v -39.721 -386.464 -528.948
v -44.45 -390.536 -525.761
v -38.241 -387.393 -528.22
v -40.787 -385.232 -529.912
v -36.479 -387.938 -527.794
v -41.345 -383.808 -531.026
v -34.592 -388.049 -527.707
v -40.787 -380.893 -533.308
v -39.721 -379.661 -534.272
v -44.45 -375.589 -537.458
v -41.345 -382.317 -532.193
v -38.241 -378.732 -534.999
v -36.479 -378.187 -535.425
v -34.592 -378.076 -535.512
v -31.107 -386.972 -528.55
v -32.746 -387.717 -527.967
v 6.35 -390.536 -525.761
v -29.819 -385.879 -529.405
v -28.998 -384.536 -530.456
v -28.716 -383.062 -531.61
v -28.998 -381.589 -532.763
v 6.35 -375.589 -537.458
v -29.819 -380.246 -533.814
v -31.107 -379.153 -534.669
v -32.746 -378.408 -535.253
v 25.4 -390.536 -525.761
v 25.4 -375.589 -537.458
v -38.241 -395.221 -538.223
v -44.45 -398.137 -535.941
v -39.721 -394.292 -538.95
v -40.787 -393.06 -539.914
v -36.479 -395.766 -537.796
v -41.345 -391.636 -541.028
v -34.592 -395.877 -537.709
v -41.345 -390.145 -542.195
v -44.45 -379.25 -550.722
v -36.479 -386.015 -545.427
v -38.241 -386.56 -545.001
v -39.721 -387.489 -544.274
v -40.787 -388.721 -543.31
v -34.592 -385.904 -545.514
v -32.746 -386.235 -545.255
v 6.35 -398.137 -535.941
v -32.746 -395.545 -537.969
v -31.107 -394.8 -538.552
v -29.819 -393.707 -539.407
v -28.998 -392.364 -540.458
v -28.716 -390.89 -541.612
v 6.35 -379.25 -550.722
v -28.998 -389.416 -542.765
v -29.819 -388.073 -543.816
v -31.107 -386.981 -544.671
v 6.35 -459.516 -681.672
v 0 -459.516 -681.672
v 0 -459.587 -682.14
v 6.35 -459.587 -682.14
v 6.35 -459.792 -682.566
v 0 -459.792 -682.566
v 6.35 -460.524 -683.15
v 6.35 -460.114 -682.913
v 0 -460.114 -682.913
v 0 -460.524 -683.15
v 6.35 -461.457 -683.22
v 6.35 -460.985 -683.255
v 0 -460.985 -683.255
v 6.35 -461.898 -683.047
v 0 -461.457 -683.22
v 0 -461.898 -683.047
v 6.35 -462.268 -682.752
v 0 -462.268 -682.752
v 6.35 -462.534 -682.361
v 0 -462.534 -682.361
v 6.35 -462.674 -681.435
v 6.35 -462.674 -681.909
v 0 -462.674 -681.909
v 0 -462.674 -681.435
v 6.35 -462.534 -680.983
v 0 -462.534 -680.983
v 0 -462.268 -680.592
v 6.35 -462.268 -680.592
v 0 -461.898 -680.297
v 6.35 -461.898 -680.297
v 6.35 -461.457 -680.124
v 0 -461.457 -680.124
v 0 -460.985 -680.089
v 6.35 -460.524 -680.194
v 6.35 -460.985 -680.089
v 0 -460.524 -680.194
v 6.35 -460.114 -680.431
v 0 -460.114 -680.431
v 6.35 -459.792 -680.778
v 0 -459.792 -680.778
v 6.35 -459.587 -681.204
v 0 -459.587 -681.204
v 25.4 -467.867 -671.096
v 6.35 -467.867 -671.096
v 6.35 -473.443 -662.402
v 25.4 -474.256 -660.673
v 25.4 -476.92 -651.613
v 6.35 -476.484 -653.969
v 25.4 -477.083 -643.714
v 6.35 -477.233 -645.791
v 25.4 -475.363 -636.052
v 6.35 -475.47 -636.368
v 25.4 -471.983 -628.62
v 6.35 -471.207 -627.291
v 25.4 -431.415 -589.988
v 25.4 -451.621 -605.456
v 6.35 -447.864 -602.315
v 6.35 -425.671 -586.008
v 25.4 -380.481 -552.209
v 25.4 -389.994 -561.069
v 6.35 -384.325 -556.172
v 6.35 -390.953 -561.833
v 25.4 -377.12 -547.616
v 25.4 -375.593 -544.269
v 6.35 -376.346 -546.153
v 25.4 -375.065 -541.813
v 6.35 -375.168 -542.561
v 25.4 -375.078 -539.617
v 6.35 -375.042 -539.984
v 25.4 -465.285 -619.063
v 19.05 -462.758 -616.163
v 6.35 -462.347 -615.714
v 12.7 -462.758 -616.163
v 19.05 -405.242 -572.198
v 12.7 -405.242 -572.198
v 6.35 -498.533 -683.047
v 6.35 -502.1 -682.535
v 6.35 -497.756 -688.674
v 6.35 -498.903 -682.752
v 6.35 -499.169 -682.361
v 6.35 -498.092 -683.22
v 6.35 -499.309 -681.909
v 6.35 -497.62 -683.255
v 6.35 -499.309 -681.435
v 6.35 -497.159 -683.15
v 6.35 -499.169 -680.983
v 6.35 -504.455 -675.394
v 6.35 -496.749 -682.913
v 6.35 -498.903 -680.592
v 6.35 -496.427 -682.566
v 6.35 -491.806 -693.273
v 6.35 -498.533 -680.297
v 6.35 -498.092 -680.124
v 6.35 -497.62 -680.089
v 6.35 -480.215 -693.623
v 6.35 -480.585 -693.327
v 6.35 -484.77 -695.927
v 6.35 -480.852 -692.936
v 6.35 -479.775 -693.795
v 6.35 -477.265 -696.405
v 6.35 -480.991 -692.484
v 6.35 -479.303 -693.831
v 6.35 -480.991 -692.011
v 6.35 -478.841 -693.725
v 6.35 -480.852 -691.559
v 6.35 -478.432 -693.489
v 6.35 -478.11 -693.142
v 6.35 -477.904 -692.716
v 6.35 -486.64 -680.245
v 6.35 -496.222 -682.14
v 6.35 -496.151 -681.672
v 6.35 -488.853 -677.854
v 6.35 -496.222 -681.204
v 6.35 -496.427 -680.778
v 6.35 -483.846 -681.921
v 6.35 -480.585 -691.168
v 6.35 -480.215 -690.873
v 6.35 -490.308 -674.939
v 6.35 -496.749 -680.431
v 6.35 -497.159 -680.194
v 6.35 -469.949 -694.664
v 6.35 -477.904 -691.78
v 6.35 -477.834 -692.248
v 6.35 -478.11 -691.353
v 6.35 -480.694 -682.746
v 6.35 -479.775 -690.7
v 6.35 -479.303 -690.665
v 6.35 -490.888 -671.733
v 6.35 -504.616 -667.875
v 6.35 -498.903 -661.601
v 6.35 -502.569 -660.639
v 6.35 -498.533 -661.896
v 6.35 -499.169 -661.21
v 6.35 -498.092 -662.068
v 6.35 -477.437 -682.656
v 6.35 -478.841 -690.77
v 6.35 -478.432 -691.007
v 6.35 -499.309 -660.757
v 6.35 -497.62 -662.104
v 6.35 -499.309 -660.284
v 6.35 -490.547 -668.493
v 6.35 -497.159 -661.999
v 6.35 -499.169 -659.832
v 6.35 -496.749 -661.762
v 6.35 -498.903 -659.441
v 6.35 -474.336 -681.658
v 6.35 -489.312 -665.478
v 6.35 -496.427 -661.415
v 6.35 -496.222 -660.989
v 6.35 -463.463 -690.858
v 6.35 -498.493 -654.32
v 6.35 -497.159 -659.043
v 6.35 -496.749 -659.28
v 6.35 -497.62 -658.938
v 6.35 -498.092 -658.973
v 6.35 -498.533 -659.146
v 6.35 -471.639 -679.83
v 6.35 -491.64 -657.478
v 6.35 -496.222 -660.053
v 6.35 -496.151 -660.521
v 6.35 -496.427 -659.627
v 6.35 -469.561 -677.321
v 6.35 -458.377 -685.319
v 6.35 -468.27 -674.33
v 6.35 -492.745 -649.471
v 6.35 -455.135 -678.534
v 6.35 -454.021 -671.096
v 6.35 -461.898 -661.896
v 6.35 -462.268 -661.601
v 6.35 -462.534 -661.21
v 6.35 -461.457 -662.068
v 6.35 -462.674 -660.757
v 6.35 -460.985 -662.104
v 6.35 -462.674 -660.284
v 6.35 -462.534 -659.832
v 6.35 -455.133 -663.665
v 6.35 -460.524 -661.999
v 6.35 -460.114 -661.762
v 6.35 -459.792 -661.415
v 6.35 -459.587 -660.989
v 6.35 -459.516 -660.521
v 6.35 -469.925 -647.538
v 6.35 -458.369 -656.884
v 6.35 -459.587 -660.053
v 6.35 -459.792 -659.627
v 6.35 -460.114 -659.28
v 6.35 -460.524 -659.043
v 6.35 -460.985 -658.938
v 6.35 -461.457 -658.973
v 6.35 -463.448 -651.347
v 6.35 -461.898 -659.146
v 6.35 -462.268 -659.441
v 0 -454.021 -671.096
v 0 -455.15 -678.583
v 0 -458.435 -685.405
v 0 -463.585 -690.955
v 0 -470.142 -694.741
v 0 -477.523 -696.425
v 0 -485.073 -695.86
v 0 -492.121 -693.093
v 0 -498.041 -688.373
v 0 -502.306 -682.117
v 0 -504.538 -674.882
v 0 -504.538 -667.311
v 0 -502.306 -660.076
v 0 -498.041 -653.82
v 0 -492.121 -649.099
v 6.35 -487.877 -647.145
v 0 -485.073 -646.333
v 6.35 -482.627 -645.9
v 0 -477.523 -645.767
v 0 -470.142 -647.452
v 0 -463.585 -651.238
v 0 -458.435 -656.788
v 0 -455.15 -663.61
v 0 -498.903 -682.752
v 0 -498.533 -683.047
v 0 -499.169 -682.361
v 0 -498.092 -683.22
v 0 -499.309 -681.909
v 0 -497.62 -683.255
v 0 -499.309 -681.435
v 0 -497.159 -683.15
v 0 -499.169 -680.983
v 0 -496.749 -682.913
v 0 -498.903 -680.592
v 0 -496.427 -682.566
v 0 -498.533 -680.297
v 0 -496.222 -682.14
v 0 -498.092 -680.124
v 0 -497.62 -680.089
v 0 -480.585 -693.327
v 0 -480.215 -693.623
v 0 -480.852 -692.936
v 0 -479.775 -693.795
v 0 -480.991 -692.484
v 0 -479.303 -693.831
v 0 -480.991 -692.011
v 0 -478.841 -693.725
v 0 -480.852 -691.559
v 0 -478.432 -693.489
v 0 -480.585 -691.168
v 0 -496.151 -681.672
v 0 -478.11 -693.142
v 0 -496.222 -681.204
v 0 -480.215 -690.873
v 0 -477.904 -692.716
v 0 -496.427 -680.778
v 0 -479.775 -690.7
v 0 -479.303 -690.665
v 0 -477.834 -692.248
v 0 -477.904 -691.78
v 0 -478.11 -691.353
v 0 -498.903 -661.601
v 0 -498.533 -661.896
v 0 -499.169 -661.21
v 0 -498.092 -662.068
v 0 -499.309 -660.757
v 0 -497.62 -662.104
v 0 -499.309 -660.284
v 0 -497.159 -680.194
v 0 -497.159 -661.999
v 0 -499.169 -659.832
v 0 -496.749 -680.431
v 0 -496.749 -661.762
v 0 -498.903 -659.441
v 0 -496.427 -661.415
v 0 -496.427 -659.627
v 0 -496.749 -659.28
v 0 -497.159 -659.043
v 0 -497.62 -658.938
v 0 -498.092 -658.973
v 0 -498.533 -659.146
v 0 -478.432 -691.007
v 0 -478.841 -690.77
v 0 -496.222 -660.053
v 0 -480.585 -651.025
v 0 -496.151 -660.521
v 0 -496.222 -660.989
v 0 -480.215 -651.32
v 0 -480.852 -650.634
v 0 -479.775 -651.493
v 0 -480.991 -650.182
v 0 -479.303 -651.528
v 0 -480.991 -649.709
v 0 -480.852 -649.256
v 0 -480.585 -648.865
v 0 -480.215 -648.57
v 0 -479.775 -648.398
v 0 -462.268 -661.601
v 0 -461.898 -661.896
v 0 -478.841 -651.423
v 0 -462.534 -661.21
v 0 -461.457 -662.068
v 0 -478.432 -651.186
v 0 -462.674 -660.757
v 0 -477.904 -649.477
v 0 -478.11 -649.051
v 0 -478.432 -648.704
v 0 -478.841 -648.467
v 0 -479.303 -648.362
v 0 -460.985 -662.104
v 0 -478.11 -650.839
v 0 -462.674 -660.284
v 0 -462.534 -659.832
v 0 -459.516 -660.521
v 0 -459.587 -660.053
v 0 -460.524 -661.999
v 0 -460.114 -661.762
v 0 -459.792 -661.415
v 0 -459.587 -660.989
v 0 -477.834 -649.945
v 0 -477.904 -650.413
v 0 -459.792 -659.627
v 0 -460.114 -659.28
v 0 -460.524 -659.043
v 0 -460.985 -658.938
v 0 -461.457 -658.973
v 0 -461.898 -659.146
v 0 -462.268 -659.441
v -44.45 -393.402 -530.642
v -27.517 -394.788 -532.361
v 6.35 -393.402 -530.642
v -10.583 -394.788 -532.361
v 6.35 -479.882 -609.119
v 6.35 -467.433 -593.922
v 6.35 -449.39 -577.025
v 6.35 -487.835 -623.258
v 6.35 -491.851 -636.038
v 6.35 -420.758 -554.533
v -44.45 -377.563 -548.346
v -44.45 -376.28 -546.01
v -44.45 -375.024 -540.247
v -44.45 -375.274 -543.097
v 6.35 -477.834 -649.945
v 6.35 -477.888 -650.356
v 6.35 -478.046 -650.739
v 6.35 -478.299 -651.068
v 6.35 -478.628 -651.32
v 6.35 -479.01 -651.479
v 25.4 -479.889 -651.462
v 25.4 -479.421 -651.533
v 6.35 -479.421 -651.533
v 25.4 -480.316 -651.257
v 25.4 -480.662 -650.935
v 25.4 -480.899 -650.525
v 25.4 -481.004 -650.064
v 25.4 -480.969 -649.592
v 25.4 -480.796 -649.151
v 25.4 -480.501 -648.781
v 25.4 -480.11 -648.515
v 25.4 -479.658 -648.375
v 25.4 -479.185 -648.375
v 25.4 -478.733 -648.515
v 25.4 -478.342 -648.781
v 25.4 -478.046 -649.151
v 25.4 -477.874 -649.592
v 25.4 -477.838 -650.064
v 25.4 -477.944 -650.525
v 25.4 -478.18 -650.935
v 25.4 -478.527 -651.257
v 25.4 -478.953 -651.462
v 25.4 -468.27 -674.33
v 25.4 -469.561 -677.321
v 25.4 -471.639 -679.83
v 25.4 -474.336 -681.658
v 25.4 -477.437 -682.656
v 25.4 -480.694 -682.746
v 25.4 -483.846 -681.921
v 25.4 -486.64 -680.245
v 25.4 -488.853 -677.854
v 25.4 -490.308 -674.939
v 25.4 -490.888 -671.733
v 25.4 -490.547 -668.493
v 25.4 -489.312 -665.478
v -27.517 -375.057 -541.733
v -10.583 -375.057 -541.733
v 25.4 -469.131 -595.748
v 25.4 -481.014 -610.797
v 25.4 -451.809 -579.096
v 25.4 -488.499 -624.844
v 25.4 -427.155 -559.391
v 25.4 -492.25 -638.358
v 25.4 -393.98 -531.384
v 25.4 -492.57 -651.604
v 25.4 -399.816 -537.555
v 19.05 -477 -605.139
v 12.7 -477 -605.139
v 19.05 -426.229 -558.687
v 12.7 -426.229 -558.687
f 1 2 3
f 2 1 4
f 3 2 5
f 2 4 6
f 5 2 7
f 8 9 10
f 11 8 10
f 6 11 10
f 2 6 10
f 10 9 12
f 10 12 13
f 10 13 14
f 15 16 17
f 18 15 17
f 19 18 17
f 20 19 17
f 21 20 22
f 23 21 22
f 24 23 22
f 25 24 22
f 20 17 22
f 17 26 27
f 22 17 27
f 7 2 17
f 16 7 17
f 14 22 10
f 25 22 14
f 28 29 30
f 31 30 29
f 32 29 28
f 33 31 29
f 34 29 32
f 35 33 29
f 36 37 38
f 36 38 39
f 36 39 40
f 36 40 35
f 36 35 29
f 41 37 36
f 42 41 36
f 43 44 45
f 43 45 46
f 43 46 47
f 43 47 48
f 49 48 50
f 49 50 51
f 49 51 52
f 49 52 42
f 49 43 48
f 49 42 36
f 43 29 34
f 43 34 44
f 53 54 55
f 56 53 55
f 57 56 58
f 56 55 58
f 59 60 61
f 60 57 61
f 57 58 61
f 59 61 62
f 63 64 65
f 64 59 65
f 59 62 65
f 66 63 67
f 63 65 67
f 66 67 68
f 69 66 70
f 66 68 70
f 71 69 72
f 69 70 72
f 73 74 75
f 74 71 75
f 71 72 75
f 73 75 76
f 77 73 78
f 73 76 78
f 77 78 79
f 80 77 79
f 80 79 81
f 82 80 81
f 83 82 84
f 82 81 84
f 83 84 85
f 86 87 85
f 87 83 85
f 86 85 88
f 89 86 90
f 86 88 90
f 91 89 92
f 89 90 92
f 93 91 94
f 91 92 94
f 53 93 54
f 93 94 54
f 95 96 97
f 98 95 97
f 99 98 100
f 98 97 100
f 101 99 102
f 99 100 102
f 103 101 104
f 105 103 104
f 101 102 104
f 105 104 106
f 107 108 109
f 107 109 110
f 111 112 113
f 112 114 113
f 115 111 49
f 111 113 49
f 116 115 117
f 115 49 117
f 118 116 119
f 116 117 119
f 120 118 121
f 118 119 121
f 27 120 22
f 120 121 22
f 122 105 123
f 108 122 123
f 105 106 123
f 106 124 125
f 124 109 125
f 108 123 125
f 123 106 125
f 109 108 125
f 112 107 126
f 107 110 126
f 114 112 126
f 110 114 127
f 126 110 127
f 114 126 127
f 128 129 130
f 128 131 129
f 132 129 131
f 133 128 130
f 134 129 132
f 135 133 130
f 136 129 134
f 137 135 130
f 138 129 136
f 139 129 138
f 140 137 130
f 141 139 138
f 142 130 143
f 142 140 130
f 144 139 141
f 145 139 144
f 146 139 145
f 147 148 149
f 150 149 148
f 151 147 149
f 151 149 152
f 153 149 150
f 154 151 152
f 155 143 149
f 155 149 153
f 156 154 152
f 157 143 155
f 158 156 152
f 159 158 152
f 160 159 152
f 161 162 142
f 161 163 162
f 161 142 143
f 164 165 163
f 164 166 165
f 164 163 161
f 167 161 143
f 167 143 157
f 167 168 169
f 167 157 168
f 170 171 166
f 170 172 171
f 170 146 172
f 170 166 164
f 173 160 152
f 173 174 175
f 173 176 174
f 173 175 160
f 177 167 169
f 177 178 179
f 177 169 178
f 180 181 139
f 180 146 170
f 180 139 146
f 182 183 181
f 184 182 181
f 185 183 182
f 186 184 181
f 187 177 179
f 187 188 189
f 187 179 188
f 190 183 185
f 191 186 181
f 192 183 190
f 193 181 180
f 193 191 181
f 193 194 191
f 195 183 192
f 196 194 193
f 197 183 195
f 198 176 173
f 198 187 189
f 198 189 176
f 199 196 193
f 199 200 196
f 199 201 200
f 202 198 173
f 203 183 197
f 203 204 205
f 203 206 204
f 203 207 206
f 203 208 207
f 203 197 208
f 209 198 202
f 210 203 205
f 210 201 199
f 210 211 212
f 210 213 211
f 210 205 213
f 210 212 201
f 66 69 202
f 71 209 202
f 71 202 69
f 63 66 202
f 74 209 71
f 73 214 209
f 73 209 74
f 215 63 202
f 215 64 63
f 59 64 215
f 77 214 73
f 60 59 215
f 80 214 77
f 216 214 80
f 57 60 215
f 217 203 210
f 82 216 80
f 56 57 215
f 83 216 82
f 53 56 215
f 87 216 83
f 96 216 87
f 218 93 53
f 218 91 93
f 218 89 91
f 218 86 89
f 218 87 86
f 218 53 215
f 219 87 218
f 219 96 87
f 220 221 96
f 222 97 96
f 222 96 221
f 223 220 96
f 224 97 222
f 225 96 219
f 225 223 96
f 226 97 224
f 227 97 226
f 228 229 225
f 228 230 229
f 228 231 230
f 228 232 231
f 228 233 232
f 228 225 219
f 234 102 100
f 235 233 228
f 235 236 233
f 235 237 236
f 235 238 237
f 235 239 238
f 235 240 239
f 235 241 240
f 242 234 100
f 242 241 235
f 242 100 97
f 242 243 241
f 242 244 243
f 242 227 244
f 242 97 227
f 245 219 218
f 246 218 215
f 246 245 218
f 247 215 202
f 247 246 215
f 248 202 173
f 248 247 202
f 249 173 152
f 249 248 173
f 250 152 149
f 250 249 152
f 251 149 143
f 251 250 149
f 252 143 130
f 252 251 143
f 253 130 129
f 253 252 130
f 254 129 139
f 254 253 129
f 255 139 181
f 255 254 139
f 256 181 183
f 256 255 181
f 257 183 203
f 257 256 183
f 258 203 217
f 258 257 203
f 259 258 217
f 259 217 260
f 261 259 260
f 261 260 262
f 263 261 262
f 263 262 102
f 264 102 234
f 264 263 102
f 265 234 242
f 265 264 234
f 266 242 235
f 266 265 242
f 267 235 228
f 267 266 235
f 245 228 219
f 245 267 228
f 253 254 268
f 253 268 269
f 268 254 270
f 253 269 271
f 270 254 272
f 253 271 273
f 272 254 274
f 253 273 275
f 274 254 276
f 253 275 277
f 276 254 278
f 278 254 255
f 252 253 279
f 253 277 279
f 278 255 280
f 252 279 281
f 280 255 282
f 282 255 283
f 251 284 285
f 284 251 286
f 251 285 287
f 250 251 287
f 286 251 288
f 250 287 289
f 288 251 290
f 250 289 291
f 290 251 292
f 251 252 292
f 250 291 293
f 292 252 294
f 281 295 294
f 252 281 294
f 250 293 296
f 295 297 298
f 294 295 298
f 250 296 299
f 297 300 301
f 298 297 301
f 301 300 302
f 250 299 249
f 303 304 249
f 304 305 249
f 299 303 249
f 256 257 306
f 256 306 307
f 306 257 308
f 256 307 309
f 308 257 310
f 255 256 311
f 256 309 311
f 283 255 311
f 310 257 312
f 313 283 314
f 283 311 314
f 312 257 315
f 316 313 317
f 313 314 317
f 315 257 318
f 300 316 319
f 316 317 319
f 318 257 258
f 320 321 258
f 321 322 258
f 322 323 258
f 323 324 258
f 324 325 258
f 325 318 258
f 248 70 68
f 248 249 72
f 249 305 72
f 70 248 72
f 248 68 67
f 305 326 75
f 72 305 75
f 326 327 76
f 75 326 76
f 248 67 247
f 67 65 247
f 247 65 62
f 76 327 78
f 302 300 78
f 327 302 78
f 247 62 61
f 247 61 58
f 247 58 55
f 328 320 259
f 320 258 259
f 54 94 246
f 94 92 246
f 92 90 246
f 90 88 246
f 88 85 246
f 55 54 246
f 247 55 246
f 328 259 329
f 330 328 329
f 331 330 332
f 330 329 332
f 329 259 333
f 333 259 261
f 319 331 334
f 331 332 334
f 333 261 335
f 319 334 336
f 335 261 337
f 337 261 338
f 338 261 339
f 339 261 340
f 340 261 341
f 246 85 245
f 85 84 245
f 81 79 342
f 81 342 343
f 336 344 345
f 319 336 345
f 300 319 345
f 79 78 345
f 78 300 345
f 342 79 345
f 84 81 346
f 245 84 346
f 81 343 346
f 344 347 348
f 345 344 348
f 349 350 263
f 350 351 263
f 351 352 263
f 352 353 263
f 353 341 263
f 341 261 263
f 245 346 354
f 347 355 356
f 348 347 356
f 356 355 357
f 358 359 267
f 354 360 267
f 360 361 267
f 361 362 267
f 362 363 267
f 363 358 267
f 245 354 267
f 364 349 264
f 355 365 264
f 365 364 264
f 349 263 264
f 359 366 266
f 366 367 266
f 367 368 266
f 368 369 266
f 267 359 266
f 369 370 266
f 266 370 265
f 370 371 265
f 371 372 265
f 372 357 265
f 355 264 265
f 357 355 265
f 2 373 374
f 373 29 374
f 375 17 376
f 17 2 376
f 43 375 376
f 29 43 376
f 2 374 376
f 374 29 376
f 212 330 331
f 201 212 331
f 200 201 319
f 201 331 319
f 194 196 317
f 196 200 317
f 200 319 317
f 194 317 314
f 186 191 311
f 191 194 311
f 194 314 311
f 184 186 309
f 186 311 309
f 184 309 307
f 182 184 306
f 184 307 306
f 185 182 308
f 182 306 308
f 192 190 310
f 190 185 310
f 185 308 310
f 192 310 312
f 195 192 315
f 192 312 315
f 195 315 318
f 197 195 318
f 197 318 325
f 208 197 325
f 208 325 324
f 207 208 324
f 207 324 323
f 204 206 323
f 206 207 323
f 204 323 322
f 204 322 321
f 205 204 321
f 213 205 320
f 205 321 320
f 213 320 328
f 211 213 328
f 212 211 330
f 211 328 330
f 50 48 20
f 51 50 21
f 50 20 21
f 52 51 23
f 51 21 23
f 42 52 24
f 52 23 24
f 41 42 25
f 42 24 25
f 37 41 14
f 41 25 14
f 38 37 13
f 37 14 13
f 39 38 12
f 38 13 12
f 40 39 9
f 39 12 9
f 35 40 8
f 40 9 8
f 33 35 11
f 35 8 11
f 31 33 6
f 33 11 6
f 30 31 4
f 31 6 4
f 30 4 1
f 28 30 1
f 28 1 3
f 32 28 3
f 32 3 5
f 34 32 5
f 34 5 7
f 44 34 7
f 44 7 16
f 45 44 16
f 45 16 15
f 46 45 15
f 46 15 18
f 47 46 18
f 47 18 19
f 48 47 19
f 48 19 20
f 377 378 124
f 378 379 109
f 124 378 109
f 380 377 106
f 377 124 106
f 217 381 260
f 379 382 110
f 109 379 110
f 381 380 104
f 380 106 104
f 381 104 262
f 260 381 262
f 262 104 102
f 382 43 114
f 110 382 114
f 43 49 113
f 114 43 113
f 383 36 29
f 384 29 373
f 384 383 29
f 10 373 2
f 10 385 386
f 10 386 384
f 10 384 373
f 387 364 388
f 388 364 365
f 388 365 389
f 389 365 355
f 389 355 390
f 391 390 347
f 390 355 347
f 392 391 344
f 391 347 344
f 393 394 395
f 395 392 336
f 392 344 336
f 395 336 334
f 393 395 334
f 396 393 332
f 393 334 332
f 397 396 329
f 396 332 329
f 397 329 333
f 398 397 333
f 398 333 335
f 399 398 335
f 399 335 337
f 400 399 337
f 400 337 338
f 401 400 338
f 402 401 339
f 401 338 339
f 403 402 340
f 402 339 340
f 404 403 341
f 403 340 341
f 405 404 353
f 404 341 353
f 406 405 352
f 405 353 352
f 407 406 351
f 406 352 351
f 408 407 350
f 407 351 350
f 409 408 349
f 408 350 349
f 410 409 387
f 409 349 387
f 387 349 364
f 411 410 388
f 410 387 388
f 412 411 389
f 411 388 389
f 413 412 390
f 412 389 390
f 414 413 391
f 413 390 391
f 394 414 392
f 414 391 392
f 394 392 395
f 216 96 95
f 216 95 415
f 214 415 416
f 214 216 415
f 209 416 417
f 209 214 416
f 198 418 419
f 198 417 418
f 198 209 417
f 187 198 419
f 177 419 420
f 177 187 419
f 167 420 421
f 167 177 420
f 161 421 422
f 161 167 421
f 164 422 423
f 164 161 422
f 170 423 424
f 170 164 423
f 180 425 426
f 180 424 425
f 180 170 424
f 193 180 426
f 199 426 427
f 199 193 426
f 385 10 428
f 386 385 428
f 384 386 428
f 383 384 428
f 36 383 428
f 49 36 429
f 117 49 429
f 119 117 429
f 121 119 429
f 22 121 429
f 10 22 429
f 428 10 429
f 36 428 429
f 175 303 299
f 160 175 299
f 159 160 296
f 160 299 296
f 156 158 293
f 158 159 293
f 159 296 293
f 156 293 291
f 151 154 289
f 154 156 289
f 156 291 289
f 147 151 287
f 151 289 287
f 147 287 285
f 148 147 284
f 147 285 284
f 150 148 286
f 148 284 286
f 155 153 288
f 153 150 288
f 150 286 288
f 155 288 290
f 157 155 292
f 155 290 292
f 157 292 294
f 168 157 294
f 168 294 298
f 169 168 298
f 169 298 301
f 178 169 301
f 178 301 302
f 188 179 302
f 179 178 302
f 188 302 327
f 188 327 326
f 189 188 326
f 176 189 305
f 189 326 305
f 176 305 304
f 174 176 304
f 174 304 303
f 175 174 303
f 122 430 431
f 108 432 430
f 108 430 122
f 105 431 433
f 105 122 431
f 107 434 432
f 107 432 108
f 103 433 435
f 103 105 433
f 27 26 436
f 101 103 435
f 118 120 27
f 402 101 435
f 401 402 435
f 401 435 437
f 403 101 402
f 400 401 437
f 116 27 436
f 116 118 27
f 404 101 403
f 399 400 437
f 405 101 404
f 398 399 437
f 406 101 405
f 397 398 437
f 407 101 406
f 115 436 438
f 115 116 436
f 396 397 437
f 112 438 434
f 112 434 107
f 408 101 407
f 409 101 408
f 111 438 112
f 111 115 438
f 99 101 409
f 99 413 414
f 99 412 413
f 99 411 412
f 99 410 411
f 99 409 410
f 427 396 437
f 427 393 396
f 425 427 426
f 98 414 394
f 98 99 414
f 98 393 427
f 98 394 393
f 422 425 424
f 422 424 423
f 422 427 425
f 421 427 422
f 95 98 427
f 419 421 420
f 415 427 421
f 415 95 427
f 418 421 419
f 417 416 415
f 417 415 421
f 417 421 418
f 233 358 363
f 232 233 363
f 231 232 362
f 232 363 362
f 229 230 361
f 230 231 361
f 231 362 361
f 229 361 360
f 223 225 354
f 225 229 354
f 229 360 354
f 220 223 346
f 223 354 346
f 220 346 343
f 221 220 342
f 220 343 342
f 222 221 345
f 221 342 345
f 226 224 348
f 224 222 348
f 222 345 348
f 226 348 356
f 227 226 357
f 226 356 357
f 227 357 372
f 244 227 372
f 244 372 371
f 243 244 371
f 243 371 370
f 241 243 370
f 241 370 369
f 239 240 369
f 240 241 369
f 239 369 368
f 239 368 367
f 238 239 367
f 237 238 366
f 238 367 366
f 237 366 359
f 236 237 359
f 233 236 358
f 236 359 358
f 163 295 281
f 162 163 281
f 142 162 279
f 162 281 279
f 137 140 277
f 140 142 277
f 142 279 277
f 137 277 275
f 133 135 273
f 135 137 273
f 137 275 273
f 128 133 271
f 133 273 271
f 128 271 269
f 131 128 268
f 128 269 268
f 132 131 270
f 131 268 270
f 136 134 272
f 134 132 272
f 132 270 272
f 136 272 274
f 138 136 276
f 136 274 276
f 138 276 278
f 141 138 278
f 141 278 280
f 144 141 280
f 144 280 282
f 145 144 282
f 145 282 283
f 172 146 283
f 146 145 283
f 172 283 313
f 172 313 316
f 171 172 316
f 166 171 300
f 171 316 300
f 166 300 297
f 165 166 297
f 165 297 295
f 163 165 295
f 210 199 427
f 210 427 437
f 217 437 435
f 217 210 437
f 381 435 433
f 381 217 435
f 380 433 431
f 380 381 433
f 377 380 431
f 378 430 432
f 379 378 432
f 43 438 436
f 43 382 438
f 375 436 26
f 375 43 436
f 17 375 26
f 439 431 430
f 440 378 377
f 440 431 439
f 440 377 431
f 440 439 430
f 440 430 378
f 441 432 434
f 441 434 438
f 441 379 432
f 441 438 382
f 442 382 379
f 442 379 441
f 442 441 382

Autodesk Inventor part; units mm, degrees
ref_plane "YZ Plane" through (0, 0, 0) normal (1, 0, 0) x (0, 1, 0)
ref_plane "XZ Plane" through (0, 0, 0) normal (0, 1, 0) x (-1, 0, 0)
ref_plane "XY Plane" through (0, 0, 0) normal (0, 0, 1) x (1, 0, 0)
sketch "Sketch1" plane through (0, 0, 0) normal (1, 0, 0) x (0, 1, 0)
  circle A0 centre (-479.4213, -671.0964) radius 25.4
  circle A1 centre (-479.4213, -671.0964) radius 88.9 projected
  circle A2 centre (-479.4213, -649.9452) radius 1.5875
  circle A3 centre (-497.7388, -660.5208) radius 1.5875
  circle A4 centre (-497.7388, -681.6721) radius 1.5875
  circle A5 centre (-479.4213, -692.2477) radius 1.5875
  circle A6 centre (-461.1038, -681.6721) radius 1.5875
  circle A7 centre (-461.1038, -660.5208) radius 1.5875
  point P0 (0, 0)
  dimension "d0" = 50.8
  dimension "d1" = 3.175
  dimension "d4" = 360
extrude "Extrusion1" add sketch "Sketch1" along normal blind 6.35 contours A0
sketch "Sketch2" plane through (6.35, -479.4213, -671.0964) normal (1, 0, 0) x (0, 0, -1)
  circle A0 centre (-21.1512, 0) radius 1.5875 projected
  spline S0 degree 3 poles (-5.6187, -9.891) (-73.0206, -34.6538) (-119.0516, 78.5765) (-145.3355, 88.8855) knots 0 0 0 0 1 1 1 1
  spline S1 degree 3 poles (0, 11.5539) (-60.9983, -36.2975) (-102.9311, 114.869) (-133.6383, 103.832) knots 0 0 0 0 1 1 1 1
  line L0 (-145.3355, 88.8855) -> (-133.6383, 103.832)
  arc A1 (-5.6187, -9.891) -> (0, 11.5539) centre (0.2097, 0.0404) ccw
  point P0 (-671.0964, 479.4213)
  point P1 (-69.3034, 5.0557)
  point P2 (-121.2912, 64.8414)
  point P3 (-55.007, 16.7301)
  point P4 (-109.594, 88.8855)
extrude "Extrusion2" add sketch "Sketch2" along normal blind 19.05
sketch "Sketch3" plane through (6.35, -479.4213, -671.0964) normal (-1, 0, 0) x (0, 0, 1)
  spline S0 degree 3 poles (21.6253, -13.3232) (80.3701, -16.9336) (121.1871, 79.4141) (145.3355, 88.8855) knots 0 0 0 0 1 1 1 1 projected
  line L0 (145.3355, 88.8855) -> (133.6383, 103.832) projected
  spline S1 degree 3 poles (133.6383, 103.832) (107.3744, 113.2719) (72.8986, 4.0539) (25.3056, 2.1884) knots 0 0 0 0 1 1 1 1 projected
  line L1 (135.1558, 81.2846) -> (120.3749, 100.1713)
  point P0 (671.0964, 479.4213)
extrude "Extrusion3" add sketch "Sketch3" along normal blind 50.8
sketch "Sketch4" plane through (-44.45, -375.5893, -537.4582) normal (0, 0.6163082, 0.787505) x (1, 0, 0)
  line L0 (50.8, -18.9795) -> (0, -18.9795) projected
  spline S0 degree 4 poles (22.0839, 128.199) (22.0839, 128.1731) (22.0839, 75.9092) (22.0839, -57.7492) (22.0839, -145.2754) (22.0839, -219.2952) (22.0839, -161.3853) (22.0839, -142.8391) knots 0 0 0 0 0 0.294993 0.49649 0.669634 1 1 1 1 1 projected
  spline S1 degree 4 poles (-3.3161, -142.8391) (-3.3161, -161.3853) (-3.3161, -219.2952) (-3.3161, -145.2754) (-3.3161, -57.7492) (-3.3161, 75.9092) (-3.3161, 128.1731) (-3.3161, 128.199) knots -1 -1 -1 -1 -1 -0.669634 -0.49649 -0.294993 0 0 0 0 0 projected
  line L1 (-3.3161, 128.199) -> (22.0839, 128.199) construction
  line L2 (9.3839, 128.199) -> (9.3839, -142.8391) construction
  circle A0 centre (9.3839, -9.4897) radius 6.35
  point P0 (44.45, -35.4614)
  dimension "d12" = 12.7
extrude "Extrusion4" cut sketch "Sketch4" against normal through all
properties part number "fork"
